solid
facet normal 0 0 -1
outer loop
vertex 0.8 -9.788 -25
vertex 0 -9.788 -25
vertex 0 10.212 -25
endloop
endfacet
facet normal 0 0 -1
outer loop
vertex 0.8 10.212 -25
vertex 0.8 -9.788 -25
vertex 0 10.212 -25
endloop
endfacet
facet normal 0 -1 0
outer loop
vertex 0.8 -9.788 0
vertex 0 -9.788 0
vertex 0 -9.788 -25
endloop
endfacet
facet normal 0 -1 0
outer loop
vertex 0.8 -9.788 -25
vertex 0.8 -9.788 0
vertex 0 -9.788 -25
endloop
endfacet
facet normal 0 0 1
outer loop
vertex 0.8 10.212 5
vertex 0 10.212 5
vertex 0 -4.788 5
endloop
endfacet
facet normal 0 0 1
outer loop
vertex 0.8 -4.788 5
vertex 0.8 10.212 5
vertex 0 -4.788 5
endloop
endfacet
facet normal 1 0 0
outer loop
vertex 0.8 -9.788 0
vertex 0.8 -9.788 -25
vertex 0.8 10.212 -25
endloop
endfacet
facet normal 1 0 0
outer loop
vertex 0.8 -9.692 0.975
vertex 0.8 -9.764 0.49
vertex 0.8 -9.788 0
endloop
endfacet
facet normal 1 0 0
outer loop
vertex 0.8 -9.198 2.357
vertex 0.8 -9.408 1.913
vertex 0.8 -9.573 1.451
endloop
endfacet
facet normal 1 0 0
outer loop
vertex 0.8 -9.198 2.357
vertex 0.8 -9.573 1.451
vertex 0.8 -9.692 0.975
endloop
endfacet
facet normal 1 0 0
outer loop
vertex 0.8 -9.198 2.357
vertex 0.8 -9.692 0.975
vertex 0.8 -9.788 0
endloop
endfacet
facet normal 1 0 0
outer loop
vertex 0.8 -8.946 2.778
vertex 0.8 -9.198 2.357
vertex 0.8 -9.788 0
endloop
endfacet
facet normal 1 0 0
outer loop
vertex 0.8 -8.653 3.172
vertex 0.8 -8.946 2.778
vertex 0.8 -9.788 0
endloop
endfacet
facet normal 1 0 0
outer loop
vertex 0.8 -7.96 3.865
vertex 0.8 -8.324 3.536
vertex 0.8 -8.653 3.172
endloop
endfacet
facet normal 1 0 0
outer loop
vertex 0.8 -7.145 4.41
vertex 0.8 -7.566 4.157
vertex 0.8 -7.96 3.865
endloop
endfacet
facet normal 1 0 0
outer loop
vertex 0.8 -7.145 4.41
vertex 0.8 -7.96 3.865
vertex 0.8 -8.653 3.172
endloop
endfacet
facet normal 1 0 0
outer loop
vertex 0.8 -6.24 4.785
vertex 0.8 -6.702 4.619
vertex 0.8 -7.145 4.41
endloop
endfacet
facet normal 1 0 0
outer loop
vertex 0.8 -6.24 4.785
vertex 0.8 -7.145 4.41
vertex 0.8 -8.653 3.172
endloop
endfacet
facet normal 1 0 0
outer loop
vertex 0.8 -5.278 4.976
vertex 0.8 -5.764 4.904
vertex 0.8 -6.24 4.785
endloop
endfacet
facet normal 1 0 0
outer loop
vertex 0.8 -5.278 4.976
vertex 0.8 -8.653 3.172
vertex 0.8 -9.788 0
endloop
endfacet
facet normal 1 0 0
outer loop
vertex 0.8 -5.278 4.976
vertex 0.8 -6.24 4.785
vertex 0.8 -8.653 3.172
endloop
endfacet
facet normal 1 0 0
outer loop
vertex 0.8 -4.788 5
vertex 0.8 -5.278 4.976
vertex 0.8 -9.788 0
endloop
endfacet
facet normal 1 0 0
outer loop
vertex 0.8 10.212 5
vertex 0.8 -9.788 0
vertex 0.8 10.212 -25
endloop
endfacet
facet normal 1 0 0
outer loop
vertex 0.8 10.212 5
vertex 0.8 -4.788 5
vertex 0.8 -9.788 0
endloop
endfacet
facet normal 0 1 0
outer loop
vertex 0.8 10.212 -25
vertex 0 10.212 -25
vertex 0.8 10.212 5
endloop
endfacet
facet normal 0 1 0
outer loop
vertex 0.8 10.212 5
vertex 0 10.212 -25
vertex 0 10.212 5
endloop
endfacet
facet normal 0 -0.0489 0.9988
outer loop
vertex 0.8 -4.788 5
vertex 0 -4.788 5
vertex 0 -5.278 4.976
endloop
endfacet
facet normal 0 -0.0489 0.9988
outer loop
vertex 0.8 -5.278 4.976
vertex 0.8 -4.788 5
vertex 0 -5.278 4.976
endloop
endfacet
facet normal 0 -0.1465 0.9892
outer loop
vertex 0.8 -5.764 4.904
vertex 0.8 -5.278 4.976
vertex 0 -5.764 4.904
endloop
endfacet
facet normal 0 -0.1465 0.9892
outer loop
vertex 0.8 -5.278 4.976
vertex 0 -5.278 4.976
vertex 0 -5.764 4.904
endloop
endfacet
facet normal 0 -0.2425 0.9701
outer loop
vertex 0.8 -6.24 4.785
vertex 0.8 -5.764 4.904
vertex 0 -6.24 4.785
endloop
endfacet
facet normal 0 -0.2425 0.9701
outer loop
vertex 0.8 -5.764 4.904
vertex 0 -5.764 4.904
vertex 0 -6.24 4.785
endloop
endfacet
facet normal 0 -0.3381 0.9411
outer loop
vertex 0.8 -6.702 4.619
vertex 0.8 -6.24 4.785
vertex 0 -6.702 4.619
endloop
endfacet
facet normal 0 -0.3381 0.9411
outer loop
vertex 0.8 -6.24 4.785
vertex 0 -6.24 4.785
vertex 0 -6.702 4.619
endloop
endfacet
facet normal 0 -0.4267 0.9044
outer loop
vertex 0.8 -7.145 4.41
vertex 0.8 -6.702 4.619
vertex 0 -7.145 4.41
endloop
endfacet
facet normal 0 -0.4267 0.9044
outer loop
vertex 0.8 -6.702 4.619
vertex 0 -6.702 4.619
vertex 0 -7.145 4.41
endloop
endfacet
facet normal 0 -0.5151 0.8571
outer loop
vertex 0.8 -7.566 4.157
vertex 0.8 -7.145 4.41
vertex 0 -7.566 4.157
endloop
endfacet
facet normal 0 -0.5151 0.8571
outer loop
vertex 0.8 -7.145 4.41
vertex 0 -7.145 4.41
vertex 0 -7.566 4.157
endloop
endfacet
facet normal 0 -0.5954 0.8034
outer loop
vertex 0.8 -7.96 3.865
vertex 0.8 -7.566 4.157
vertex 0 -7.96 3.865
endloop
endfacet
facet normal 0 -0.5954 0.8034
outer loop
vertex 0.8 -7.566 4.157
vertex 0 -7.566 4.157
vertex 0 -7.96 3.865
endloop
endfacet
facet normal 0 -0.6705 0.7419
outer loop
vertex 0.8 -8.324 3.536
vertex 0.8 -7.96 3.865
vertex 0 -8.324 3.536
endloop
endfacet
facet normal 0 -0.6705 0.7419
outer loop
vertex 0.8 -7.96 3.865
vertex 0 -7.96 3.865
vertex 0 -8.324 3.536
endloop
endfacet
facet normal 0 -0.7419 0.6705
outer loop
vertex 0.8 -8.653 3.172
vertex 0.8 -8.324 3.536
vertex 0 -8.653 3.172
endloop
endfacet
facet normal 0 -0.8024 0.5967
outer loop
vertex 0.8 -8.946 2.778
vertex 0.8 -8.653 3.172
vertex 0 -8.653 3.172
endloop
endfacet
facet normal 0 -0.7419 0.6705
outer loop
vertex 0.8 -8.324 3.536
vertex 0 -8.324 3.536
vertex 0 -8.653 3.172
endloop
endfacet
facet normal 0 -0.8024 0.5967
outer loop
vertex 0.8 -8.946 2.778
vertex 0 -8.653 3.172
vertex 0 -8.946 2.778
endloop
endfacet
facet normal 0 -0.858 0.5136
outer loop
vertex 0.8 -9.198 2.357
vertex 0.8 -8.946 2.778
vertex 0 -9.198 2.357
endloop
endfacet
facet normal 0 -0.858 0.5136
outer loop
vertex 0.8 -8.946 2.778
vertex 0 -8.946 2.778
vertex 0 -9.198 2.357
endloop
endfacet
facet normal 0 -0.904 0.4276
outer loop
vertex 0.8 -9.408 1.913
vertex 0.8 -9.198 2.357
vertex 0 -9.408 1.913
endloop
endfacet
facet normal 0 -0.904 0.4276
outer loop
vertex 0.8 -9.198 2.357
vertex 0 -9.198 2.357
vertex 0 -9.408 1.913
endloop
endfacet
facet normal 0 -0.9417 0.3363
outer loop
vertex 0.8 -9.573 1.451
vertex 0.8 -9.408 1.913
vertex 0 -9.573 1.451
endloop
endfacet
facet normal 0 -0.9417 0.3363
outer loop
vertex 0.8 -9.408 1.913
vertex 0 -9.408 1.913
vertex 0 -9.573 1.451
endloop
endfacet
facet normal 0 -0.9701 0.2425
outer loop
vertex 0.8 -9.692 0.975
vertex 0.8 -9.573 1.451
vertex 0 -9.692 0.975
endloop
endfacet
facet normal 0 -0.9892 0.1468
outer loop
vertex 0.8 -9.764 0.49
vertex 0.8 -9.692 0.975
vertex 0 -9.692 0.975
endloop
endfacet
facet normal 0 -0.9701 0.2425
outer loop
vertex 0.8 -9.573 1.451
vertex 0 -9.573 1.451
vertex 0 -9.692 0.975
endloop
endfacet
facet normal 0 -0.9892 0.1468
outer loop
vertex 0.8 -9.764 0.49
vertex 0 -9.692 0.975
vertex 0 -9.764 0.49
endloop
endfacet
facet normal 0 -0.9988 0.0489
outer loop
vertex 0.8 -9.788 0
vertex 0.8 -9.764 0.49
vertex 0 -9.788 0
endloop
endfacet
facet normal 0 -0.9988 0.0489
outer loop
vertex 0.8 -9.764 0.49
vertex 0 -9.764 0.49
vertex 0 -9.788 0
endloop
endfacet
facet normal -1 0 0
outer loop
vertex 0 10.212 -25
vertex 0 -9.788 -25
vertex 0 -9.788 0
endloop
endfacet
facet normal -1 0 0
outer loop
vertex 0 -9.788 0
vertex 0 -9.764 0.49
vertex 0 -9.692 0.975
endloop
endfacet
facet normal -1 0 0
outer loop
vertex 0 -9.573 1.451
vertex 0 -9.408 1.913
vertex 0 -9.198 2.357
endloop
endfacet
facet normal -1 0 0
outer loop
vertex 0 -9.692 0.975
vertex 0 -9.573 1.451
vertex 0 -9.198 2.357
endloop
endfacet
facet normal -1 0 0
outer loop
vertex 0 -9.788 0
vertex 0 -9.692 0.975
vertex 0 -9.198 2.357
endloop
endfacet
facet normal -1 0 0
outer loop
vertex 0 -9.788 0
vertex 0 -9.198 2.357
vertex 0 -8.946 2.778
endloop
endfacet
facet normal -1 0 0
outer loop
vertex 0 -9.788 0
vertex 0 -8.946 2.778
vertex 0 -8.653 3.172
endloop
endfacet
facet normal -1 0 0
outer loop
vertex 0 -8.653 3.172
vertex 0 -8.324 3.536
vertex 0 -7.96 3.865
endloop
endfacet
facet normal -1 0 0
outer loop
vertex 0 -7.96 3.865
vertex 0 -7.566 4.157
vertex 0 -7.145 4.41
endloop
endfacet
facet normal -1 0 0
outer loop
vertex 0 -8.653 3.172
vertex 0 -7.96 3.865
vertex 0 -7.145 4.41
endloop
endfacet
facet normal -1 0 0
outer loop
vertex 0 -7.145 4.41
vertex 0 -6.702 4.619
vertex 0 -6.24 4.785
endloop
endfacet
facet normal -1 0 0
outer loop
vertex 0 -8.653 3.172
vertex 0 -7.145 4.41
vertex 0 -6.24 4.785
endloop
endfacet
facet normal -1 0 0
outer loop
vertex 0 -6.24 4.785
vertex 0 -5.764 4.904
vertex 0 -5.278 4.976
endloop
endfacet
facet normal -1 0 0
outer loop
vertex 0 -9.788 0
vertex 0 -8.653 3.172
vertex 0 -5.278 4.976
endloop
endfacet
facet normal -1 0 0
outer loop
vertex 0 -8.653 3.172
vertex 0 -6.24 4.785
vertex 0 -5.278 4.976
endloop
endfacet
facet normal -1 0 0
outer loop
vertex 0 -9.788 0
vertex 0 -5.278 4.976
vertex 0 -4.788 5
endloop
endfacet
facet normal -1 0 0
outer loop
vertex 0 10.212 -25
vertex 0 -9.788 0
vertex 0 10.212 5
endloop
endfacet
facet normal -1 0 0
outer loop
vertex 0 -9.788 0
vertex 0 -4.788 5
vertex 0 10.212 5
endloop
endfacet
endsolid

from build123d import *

# Parameters (mm, degrees)
F1_DEPTH = 0.8


with BuildPart() as f1:
    # F0 (on Right) → F1 (new body)
    with BuildSketch(Plane.YZ):
        with BuildLine():
            ThreePointArc((-4.788236, 5), (-8.32377, 3.535534), (-9.788236, 0))
            Line((-9.788236, 0), (-9.788236, -25))
            Line((-9.788236, -25), (10.211764, -25))
            Line((10.211764, -25), (10.211764, 5))
            Line((10.211764, 5), (-4.788236, 5))
        make_face()
    extrude(amount=F1_DEPTH)


solid = f1.part
